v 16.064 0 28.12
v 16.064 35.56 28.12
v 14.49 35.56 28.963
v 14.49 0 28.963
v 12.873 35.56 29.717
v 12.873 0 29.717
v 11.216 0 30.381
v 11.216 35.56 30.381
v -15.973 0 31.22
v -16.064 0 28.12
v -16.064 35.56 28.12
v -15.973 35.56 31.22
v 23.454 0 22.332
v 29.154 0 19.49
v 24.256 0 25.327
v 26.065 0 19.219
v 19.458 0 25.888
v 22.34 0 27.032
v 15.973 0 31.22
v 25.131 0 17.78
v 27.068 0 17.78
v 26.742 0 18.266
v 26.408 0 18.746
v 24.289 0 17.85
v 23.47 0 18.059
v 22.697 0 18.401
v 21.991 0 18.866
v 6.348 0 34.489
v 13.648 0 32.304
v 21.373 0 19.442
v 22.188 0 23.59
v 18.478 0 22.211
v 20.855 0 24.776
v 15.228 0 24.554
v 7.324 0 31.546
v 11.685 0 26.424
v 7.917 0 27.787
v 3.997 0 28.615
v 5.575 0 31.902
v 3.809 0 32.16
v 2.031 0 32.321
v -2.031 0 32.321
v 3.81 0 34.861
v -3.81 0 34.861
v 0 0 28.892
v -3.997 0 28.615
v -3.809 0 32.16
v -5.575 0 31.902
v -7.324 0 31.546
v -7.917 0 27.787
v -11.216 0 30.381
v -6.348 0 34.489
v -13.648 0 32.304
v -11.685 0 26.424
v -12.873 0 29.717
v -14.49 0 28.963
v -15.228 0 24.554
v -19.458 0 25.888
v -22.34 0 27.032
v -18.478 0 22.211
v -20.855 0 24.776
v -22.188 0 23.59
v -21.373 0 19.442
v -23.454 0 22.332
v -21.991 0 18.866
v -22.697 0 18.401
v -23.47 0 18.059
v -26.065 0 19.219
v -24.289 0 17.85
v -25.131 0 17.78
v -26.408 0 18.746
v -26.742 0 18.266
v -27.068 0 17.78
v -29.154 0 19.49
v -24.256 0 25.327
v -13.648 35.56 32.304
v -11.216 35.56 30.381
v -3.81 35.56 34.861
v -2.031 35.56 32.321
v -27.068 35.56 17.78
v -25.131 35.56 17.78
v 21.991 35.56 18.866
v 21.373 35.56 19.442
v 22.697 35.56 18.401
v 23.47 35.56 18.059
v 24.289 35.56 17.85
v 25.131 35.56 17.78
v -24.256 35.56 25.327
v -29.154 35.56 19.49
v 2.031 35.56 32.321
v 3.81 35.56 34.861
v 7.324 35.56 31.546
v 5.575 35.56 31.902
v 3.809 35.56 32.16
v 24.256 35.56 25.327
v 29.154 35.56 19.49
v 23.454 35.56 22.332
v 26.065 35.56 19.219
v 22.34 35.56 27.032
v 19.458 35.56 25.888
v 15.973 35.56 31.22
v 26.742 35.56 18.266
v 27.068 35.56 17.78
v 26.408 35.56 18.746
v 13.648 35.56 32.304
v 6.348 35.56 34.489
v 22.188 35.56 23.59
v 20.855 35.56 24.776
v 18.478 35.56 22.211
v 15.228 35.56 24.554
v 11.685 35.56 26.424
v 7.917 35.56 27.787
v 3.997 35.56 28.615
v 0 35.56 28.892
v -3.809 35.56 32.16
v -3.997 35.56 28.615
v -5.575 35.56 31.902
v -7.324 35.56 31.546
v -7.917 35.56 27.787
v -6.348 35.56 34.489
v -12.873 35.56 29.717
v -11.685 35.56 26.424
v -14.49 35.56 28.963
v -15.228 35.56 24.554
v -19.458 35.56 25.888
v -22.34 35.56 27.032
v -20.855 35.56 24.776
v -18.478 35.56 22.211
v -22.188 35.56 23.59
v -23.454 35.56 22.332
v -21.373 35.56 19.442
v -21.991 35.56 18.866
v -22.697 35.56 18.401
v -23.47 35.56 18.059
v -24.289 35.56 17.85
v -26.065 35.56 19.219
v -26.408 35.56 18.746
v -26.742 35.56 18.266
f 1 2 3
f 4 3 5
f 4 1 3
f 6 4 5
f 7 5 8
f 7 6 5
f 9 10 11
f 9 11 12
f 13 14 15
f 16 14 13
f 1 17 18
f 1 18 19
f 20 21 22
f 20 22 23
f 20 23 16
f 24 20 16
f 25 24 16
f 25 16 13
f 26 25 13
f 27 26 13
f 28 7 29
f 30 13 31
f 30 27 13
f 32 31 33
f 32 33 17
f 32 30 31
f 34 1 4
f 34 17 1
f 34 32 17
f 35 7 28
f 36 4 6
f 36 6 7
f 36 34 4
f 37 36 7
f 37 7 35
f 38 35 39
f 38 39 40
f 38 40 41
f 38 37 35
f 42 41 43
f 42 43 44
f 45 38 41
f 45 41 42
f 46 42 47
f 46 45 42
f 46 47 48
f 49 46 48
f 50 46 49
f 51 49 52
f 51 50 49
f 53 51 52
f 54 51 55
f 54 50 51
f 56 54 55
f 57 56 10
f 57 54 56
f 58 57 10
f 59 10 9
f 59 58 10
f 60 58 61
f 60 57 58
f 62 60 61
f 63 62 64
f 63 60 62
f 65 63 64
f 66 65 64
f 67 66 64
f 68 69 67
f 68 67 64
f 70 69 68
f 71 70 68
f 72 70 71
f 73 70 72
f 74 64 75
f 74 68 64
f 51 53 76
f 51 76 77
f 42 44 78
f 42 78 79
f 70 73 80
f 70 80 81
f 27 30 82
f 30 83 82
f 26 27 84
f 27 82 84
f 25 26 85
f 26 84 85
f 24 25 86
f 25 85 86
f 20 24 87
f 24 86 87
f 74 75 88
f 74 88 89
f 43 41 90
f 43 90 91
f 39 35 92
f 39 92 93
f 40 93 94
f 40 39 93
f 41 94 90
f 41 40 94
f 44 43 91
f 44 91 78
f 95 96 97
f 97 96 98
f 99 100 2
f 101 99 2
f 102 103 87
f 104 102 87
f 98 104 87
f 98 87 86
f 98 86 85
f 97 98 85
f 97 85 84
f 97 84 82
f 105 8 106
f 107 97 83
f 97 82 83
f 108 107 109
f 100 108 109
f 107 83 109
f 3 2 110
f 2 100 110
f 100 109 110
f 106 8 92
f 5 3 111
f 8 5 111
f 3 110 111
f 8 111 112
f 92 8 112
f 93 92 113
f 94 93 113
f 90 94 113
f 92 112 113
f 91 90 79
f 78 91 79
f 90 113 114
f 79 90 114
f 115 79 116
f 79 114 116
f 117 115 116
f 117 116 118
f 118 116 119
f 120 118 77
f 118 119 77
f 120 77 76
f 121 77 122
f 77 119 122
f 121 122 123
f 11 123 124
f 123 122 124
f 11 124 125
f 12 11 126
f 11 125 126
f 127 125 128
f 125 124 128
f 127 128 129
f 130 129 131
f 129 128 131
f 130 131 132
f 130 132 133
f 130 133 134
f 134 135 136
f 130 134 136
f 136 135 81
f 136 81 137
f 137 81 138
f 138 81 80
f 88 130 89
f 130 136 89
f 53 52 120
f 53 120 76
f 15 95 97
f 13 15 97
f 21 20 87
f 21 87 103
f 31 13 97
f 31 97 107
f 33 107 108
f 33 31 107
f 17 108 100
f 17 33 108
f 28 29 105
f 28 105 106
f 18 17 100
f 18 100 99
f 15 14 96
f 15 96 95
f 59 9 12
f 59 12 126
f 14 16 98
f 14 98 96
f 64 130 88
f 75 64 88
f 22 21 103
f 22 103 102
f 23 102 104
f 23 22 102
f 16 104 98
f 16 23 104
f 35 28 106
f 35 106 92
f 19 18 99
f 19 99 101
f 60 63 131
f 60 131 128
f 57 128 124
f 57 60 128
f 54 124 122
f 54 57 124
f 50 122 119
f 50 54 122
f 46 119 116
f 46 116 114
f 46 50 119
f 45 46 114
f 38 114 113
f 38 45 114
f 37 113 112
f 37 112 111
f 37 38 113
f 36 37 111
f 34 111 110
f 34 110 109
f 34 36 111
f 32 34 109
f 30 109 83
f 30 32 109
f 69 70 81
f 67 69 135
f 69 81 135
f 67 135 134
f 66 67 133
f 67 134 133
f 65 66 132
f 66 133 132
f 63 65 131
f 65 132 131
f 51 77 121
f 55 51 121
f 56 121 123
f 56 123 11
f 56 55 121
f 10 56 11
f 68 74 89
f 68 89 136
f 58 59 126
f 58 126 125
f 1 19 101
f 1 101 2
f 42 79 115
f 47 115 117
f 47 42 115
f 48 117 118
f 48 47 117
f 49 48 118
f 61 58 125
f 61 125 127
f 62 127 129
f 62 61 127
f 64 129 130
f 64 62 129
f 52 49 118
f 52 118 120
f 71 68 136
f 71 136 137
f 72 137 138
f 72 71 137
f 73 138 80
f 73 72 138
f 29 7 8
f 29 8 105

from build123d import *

# Parameters (mm, degrees)
BOSS_EXTRUDE1_DEPTH = 35.56
CAVITY1_DEPTH       = 35.56
FILLET1_R           = 5.08


# Read off the part's stored shape, not the designer's step: Cavity1
with BuildPart() as part:
    # Sketch1 → Boss-Extrude1 (new body)
    with BuildSketch(Plane(origin=(0, 0, 0), x_dir=(1, 0, 0), z_dir=(0, 1, 0))):
        with BuildLine():
            Line((-31.526966632, -17.78), (-22.773848077, -17.78))
            ThreePointArc((-22.773848077, -17.78), (0, -28.8925), (22.773848077, -17.78))
            Line((22.773848077, -17.78), (31.526966632, -17.78))
            ThreePointArc((31.526966632, -17.78), (0, -36.195), (-31.526966632, -17.78))
        make_face()
    extrude(amount=BOSS_EXTRUDE1_DEPTH)

    # Cavity1 outline → Cavity1 (cut)
    with BuildSketch(Plane(origin=(0, 0, 0), x_dir=(1, 0, 0), z_dir=(0, 1, 0))):
        with BuildLine():
            Line((31.526966632, -17.78), (27.067689687, -17.78))
            ThreePointArc((27.067689687, -17.78), (26.576241445, -18.506529001), (26.065297512, -19.219482059))
            Line((26.065297512, -19.219482059), (29.154265611, -19.489731749))
            Line((29.154265611, -19.489731749), (24.256224025, -25.326990406))
            Line((24.256224025, -25.326990406), (23.453686354, -22.331879039))
            ThreePointArc((23.453686354, -22.331879039), (21.529414108, -24.192406932), (19.458072067, -25.887673832))
            Line((19.458072067, -25.887673832), (22.339762624, -27.032496238))
            Line((22.339762624, -27.032496238), (15.973345502, -31.219754651))
            Line((15.973345502, -31.219754651), (16.063530451, -28.120298975))
            ThreePointArc((16.063530451, -28.120298975), (13.686492406, -29.350777683), (11.215960427, -30.380758001))
            Line((11.215960427, -30.380758001), (13.648250992, -32.303964027))
            Line((13.648250992, -32.303964027), (6.348370909, -34.48940466))
            Line((6.348370909, -34.48940466), (7.323701052, -31.546023963))
            ThreePointArc((7.323701052, -31.546023963), (4.693618264, -32.043067465), (2.031472853, -32.321221249))
            Line((2.031472853, -32.321221249), (3.81, -34.861221249))
            Line((3.81, -34.861221249), (-3.81, -34.861221249))
            Line((-3.81, -34.861221249), (-2.031472853, -32.321221249))
            ThreePointArc((-2.031472853, -32.321221249), (-4.693618264, -32.043067465), (-7.323701052, -31.546023963))
            Line((-7.323701052, -31.546023963), (-6.348370909, -34.48940466))
            Line((-6.348370909, -34.48940466), (-13.648250992, -32.303964027))
            Line((-13.648250992, -32.303964027), (-11.215960427, -30.380758001))
            ThreePointArc((-11.215960427, -30.380758001), (-13.686492406, -29.350777683), (-16.063530451, -28.120298975))
            Line((-16.063530451, -28.120298975), (-15.973345502, -31.219754651))
            Line((-15.973345502, -31.219754651), (-22.339762624, -27.032496238))
            Line((-22.339762624, -27.032496238), (-19.458072067, -25.887673832))
            ThreePointArc((-19.458072067, -25.887673832), (-21.529414108, -24.192406932), (-23.453686354, -22.331879039))
            Line((-23.453686354, -22.331879039), (-24.256224025, -25.326990406))
            Line((-24.256224025, -25.326990406), (-29.154265611, -19.489731749))
            Line((-29.154265611, -19.489731749), (-26.065297512, -19.219482059))
            ThreePointArc((-26.065297512, -19.219482059), (-26.576241445, -18.506529001), (-27.067689687, -17.78))
            Line((-27.067689687, -17.78), (-31.526966632, -17.78))
            ThreePointArc((-31.526966632, -17.78), (0, -36.195), (31.526966632, -17.78))
        make_face()
    extrude(amount=CAVITY1_DEPTH, mode=Mode.SUBTRACT)

    # Fillet1
    fillet1_edges = [part.edges().sort_by_distance(p)[0] for p in [
        (-22.773848077, 17.78, 17.78),
        (22.773848077, 17.78, 17.78),
    ]]
    fillet(fillet1_edges, radius=FILLET1_R)


solid = part.part
